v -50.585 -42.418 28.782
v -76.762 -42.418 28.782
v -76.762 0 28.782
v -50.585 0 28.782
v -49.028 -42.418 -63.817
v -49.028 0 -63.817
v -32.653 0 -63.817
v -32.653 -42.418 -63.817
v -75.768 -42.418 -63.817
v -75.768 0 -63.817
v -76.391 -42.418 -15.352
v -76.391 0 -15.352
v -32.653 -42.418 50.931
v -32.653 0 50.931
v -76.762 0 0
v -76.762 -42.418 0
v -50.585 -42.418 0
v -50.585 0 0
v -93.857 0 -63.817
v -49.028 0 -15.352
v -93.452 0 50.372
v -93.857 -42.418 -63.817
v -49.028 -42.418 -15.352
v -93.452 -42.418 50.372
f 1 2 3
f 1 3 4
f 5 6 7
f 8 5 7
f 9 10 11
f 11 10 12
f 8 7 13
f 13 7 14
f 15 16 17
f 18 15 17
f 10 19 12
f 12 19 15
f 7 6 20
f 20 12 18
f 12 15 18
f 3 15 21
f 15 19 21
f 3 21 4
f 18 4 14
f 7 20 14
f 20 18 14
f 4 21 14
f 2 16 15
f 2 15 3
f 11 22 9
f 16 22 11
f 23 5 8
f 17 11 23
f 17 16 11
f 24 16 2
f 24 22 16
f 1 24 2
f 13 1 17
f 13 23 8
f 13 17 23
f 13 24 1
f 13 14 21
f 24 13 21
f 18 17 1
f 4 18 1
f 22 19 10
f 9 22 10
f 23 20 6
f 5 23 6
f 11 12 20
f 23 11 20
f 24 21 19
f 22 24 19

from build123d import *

# Parameters (mm, degrees)
F1_DEPTH = 42.418
F2_W     = 26.176628
F2_H     = 28.782386
F3_DEPTH = 108.966


with BuildPart() as f1:
    # F0 (on Front) → F1 (new body)
    with BuildSketch(Plane.XZ):
        Polygon((-32.652762, 50.93069), (-93.452446, 50.371993), (-93.857206, -63.817397), (-75.767848, -63.817397), (-76.391129, -15.351797), (-49.027815, -15.351797), (-49.027815, -63.817397), (-32.652762, -63.817397), align=None)
    extrude(amount=F1_DEPTH)

    # F2 (on face) → F3 (cut)
    with BuildSketch(Plane.XZ.offset(42.418)):
        with Locations((-63.673811, 14.391193)):
            Rectangle(F2_W, F2_H)
    extrude(amount=-F3_DEPTH, mode=Mode.SUBTRACT)


solid = f1.part
